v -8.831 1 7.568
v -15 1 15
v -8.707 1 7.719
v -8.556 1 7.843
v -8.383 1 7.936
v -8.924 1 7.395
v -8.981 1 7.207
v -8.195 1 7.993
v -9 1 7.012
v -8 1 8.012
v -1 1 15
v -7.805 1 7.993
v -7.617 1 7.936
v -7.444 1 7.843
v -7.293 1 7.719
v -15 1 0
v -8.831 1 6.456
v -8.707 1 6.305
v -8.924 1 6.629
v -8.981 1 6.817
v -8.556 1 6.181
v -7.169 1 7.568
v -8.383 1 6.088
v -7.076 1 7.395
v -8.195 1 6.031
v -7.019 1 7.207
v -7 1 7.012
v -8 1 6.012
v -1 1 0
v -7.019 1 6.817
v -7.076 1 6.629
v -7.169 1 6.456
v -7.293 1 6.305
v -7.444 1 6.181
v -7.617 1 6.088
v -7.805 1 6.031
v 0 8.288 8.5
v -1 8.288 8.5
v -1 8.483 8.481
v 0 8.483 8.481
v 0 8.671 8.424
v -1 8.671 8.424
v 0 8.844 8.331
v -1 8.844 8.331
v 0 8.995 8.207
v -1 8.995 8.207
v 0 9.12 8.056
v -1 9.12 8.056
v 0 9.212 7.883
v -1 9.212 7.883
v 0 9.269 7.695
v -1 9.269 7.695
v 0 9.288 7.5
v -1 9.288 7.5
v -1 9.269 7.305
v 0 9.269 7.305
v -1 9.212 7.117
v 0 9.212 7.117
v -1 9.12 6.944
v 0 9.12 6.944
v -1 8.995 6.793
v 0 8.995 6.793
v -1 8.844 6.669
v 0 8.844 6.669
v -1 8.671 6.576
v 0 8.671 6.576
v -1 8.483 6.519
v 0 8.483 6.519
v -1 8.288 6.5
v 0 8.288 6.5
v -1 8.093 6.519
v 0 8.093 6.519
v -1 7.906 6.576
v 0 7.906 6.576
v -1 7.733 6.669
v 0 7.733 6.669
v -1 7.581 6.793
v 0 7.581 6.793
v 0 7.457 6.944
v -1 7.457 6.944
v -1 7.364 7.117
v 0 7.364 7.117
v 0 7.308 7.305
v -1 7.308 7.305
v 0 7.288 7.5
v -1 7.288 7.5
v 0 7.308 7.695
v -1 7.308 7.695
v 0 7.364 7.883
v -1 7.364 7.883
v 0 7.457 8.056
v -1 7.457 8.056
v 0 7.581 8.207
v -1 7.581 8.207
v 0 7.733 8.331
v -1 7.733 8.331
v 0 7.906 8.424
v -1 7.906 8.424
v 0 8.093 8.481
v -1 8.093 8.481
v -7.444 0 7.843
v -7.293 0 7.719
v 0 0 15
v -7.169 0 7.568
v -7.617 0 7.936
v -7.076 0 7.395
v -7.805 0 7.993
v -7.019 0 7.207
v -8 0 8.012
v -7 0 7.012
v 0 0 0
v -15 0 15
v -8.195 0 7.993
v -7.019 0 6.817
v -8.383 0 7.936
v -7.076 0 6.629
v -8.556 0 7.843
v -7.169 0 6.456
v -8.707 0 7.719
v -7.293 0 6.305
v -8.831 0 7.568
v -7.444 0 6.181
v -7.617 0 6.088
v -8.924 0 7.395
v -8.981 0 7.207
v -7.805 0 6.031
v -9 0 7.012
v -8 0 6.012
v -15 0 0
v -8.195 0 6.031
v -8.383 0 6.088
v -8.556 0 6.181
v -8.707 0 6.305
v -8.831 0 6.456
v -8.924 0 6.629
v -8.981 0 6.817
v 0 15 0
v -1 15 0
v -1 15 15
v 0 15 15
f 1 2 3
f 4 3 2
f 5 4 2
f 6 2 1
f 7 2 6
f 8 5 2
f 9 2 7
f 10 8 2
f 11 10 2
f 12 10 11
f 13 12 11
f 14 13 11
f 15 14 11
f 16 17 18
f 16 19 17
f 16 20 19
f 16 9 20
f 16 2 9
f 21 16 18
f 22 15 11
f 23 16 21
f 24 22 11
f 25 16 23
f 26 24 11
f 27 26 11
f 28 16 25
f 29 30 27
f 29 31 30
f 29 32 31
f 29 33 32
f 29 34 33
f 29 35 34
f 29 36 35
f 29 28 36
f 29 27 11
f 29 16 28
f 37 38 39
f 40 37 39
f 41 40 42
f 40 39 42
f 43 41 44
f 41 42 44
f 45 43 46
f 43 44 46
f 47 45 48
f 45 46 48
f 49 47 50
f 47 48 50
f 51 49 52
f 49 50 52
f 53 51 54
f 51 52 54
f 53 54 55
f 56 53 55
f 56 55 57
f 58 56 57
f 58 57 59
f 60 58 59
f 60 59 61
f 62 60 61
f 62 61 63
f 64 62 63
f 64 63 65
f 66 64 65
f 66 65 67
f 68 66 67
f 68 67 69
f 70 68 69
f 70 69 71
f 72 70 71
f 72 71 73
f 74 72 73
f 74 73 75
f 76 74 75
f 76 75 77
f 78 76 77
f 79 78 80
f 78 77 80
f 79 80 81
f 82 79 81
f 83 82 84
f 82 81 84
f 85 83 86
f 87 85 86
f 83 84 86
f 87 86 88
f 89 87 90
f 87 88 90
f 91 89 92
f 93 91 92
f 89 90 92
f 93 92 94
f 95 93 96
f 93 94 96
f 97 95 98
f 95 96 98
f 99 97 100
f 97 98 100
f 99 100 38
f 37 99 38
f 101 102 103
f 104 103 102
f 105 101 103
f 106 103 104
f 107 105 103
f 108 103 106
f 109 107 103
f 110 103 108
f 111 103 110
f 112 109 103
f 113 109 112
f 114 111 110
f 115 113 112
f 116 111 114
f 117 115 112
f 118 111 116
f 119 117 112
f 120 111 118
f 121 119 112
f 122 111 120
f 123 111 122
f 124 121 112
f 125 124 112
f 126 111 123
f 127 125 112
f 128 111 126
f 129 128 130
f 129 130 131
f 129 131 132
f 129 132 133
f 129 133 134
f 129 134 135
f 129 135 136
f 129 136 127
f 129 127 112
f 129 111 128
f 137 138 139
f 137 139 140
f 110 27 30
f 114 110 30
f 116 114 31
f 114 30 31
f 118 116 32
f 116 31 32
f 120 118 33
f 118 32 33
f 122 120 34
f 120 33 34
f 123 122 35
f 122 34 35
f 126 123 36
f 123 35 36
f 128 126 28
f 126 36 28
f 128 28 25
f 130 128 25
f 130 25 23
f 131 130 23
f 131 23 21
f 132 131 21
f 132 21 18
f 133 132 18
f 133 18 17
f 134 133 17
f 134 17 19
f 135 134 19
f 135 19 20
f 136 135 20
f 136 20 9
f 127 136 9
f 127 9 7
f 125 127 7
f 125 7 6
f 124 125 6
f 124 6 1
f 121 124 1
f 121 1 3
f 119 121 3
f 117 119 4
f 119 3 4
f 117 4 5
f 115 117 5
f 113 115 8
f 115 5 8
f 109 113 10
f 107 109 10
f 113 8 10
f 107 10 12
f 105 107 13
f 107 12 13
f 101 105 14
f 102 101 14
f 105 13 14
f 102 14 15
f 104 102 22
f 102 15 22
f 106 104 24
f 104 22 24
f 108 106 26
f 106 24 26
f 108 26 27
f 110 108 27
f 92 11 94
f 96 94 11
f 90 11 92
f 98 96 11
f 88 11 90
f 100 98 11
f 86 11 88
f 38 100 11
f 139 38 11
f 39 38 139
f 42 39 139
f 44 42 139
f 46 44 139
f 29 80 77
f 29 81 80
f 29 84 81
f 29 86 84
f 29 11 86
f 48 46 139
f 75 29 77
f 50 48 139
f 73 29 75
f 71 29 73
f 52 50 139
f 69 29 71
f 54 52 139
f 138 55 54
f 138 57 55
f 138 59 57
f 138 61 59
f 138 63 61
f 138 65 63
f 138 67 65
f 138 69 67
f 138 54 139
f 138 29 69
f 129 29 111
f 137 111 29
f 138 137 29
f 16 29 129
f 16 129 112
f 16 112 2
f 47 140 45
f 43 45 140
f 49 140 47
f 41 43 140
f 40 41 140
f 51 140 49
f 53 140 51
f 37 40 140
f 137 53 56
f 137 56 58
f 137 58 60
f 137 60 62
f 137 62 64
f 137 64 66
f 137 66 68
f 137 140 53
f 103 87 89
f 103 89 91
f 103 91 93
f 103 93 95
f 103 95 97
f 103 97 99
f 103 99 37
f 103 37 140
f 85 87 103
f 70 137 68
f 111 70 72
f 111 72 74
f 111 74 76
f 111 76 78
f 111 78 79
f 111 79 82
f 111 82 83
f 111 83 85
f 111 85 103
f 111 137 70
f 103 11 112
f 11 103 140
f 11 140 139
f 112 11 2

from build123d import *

# Parameters (mm, degrees)
EXTRUDE_1_DEPTH     = 15
SKETCH_2_R          = 1
CUT_EXTRUDE_1_DEPTH = 2
SKETCH_3_R          = 1
CUT_EXTRUDE_2_DEPTH = 2


with BuildPart() as part:
    # 草图1 → 凸台-拉伸1 (new body)
    with BuildSketch(Plane.XY):
        Polygon((0, 0), (-15, 0), (-15, 1), (-1, 1), (-1, 15), (0, 15), align=None)
    extrude(amount=EXTRUDE_1_DEPTH)

    # 草图2 → 切除-拉伸1 (cut, through all)
    with BuildSketch(Plane.ZY.offset(1)):
        with Locations((7.5, 8.288332676)):
            Circle(SKETCH_2_R)
    extrude(amount=-CUT_EXTRUDE_1_DEPTH, mode=Mode.SUBTRACT)

    # 草图3 → 切除-拉伸2 (cut, through all)
    with BuildSketch(Plane(origin=(0, 1, 0), x_dir=(1, 0, 0), z_dir=(0, 1, 0))):
        with Locations((-8, -7.011984534)):
            Circle(SKETCH_3_R)
    extrude(amount=-CUT_EXTRUDE_2_DEPTH, mode=Mode.SUBTRACT)


solid = part.part
